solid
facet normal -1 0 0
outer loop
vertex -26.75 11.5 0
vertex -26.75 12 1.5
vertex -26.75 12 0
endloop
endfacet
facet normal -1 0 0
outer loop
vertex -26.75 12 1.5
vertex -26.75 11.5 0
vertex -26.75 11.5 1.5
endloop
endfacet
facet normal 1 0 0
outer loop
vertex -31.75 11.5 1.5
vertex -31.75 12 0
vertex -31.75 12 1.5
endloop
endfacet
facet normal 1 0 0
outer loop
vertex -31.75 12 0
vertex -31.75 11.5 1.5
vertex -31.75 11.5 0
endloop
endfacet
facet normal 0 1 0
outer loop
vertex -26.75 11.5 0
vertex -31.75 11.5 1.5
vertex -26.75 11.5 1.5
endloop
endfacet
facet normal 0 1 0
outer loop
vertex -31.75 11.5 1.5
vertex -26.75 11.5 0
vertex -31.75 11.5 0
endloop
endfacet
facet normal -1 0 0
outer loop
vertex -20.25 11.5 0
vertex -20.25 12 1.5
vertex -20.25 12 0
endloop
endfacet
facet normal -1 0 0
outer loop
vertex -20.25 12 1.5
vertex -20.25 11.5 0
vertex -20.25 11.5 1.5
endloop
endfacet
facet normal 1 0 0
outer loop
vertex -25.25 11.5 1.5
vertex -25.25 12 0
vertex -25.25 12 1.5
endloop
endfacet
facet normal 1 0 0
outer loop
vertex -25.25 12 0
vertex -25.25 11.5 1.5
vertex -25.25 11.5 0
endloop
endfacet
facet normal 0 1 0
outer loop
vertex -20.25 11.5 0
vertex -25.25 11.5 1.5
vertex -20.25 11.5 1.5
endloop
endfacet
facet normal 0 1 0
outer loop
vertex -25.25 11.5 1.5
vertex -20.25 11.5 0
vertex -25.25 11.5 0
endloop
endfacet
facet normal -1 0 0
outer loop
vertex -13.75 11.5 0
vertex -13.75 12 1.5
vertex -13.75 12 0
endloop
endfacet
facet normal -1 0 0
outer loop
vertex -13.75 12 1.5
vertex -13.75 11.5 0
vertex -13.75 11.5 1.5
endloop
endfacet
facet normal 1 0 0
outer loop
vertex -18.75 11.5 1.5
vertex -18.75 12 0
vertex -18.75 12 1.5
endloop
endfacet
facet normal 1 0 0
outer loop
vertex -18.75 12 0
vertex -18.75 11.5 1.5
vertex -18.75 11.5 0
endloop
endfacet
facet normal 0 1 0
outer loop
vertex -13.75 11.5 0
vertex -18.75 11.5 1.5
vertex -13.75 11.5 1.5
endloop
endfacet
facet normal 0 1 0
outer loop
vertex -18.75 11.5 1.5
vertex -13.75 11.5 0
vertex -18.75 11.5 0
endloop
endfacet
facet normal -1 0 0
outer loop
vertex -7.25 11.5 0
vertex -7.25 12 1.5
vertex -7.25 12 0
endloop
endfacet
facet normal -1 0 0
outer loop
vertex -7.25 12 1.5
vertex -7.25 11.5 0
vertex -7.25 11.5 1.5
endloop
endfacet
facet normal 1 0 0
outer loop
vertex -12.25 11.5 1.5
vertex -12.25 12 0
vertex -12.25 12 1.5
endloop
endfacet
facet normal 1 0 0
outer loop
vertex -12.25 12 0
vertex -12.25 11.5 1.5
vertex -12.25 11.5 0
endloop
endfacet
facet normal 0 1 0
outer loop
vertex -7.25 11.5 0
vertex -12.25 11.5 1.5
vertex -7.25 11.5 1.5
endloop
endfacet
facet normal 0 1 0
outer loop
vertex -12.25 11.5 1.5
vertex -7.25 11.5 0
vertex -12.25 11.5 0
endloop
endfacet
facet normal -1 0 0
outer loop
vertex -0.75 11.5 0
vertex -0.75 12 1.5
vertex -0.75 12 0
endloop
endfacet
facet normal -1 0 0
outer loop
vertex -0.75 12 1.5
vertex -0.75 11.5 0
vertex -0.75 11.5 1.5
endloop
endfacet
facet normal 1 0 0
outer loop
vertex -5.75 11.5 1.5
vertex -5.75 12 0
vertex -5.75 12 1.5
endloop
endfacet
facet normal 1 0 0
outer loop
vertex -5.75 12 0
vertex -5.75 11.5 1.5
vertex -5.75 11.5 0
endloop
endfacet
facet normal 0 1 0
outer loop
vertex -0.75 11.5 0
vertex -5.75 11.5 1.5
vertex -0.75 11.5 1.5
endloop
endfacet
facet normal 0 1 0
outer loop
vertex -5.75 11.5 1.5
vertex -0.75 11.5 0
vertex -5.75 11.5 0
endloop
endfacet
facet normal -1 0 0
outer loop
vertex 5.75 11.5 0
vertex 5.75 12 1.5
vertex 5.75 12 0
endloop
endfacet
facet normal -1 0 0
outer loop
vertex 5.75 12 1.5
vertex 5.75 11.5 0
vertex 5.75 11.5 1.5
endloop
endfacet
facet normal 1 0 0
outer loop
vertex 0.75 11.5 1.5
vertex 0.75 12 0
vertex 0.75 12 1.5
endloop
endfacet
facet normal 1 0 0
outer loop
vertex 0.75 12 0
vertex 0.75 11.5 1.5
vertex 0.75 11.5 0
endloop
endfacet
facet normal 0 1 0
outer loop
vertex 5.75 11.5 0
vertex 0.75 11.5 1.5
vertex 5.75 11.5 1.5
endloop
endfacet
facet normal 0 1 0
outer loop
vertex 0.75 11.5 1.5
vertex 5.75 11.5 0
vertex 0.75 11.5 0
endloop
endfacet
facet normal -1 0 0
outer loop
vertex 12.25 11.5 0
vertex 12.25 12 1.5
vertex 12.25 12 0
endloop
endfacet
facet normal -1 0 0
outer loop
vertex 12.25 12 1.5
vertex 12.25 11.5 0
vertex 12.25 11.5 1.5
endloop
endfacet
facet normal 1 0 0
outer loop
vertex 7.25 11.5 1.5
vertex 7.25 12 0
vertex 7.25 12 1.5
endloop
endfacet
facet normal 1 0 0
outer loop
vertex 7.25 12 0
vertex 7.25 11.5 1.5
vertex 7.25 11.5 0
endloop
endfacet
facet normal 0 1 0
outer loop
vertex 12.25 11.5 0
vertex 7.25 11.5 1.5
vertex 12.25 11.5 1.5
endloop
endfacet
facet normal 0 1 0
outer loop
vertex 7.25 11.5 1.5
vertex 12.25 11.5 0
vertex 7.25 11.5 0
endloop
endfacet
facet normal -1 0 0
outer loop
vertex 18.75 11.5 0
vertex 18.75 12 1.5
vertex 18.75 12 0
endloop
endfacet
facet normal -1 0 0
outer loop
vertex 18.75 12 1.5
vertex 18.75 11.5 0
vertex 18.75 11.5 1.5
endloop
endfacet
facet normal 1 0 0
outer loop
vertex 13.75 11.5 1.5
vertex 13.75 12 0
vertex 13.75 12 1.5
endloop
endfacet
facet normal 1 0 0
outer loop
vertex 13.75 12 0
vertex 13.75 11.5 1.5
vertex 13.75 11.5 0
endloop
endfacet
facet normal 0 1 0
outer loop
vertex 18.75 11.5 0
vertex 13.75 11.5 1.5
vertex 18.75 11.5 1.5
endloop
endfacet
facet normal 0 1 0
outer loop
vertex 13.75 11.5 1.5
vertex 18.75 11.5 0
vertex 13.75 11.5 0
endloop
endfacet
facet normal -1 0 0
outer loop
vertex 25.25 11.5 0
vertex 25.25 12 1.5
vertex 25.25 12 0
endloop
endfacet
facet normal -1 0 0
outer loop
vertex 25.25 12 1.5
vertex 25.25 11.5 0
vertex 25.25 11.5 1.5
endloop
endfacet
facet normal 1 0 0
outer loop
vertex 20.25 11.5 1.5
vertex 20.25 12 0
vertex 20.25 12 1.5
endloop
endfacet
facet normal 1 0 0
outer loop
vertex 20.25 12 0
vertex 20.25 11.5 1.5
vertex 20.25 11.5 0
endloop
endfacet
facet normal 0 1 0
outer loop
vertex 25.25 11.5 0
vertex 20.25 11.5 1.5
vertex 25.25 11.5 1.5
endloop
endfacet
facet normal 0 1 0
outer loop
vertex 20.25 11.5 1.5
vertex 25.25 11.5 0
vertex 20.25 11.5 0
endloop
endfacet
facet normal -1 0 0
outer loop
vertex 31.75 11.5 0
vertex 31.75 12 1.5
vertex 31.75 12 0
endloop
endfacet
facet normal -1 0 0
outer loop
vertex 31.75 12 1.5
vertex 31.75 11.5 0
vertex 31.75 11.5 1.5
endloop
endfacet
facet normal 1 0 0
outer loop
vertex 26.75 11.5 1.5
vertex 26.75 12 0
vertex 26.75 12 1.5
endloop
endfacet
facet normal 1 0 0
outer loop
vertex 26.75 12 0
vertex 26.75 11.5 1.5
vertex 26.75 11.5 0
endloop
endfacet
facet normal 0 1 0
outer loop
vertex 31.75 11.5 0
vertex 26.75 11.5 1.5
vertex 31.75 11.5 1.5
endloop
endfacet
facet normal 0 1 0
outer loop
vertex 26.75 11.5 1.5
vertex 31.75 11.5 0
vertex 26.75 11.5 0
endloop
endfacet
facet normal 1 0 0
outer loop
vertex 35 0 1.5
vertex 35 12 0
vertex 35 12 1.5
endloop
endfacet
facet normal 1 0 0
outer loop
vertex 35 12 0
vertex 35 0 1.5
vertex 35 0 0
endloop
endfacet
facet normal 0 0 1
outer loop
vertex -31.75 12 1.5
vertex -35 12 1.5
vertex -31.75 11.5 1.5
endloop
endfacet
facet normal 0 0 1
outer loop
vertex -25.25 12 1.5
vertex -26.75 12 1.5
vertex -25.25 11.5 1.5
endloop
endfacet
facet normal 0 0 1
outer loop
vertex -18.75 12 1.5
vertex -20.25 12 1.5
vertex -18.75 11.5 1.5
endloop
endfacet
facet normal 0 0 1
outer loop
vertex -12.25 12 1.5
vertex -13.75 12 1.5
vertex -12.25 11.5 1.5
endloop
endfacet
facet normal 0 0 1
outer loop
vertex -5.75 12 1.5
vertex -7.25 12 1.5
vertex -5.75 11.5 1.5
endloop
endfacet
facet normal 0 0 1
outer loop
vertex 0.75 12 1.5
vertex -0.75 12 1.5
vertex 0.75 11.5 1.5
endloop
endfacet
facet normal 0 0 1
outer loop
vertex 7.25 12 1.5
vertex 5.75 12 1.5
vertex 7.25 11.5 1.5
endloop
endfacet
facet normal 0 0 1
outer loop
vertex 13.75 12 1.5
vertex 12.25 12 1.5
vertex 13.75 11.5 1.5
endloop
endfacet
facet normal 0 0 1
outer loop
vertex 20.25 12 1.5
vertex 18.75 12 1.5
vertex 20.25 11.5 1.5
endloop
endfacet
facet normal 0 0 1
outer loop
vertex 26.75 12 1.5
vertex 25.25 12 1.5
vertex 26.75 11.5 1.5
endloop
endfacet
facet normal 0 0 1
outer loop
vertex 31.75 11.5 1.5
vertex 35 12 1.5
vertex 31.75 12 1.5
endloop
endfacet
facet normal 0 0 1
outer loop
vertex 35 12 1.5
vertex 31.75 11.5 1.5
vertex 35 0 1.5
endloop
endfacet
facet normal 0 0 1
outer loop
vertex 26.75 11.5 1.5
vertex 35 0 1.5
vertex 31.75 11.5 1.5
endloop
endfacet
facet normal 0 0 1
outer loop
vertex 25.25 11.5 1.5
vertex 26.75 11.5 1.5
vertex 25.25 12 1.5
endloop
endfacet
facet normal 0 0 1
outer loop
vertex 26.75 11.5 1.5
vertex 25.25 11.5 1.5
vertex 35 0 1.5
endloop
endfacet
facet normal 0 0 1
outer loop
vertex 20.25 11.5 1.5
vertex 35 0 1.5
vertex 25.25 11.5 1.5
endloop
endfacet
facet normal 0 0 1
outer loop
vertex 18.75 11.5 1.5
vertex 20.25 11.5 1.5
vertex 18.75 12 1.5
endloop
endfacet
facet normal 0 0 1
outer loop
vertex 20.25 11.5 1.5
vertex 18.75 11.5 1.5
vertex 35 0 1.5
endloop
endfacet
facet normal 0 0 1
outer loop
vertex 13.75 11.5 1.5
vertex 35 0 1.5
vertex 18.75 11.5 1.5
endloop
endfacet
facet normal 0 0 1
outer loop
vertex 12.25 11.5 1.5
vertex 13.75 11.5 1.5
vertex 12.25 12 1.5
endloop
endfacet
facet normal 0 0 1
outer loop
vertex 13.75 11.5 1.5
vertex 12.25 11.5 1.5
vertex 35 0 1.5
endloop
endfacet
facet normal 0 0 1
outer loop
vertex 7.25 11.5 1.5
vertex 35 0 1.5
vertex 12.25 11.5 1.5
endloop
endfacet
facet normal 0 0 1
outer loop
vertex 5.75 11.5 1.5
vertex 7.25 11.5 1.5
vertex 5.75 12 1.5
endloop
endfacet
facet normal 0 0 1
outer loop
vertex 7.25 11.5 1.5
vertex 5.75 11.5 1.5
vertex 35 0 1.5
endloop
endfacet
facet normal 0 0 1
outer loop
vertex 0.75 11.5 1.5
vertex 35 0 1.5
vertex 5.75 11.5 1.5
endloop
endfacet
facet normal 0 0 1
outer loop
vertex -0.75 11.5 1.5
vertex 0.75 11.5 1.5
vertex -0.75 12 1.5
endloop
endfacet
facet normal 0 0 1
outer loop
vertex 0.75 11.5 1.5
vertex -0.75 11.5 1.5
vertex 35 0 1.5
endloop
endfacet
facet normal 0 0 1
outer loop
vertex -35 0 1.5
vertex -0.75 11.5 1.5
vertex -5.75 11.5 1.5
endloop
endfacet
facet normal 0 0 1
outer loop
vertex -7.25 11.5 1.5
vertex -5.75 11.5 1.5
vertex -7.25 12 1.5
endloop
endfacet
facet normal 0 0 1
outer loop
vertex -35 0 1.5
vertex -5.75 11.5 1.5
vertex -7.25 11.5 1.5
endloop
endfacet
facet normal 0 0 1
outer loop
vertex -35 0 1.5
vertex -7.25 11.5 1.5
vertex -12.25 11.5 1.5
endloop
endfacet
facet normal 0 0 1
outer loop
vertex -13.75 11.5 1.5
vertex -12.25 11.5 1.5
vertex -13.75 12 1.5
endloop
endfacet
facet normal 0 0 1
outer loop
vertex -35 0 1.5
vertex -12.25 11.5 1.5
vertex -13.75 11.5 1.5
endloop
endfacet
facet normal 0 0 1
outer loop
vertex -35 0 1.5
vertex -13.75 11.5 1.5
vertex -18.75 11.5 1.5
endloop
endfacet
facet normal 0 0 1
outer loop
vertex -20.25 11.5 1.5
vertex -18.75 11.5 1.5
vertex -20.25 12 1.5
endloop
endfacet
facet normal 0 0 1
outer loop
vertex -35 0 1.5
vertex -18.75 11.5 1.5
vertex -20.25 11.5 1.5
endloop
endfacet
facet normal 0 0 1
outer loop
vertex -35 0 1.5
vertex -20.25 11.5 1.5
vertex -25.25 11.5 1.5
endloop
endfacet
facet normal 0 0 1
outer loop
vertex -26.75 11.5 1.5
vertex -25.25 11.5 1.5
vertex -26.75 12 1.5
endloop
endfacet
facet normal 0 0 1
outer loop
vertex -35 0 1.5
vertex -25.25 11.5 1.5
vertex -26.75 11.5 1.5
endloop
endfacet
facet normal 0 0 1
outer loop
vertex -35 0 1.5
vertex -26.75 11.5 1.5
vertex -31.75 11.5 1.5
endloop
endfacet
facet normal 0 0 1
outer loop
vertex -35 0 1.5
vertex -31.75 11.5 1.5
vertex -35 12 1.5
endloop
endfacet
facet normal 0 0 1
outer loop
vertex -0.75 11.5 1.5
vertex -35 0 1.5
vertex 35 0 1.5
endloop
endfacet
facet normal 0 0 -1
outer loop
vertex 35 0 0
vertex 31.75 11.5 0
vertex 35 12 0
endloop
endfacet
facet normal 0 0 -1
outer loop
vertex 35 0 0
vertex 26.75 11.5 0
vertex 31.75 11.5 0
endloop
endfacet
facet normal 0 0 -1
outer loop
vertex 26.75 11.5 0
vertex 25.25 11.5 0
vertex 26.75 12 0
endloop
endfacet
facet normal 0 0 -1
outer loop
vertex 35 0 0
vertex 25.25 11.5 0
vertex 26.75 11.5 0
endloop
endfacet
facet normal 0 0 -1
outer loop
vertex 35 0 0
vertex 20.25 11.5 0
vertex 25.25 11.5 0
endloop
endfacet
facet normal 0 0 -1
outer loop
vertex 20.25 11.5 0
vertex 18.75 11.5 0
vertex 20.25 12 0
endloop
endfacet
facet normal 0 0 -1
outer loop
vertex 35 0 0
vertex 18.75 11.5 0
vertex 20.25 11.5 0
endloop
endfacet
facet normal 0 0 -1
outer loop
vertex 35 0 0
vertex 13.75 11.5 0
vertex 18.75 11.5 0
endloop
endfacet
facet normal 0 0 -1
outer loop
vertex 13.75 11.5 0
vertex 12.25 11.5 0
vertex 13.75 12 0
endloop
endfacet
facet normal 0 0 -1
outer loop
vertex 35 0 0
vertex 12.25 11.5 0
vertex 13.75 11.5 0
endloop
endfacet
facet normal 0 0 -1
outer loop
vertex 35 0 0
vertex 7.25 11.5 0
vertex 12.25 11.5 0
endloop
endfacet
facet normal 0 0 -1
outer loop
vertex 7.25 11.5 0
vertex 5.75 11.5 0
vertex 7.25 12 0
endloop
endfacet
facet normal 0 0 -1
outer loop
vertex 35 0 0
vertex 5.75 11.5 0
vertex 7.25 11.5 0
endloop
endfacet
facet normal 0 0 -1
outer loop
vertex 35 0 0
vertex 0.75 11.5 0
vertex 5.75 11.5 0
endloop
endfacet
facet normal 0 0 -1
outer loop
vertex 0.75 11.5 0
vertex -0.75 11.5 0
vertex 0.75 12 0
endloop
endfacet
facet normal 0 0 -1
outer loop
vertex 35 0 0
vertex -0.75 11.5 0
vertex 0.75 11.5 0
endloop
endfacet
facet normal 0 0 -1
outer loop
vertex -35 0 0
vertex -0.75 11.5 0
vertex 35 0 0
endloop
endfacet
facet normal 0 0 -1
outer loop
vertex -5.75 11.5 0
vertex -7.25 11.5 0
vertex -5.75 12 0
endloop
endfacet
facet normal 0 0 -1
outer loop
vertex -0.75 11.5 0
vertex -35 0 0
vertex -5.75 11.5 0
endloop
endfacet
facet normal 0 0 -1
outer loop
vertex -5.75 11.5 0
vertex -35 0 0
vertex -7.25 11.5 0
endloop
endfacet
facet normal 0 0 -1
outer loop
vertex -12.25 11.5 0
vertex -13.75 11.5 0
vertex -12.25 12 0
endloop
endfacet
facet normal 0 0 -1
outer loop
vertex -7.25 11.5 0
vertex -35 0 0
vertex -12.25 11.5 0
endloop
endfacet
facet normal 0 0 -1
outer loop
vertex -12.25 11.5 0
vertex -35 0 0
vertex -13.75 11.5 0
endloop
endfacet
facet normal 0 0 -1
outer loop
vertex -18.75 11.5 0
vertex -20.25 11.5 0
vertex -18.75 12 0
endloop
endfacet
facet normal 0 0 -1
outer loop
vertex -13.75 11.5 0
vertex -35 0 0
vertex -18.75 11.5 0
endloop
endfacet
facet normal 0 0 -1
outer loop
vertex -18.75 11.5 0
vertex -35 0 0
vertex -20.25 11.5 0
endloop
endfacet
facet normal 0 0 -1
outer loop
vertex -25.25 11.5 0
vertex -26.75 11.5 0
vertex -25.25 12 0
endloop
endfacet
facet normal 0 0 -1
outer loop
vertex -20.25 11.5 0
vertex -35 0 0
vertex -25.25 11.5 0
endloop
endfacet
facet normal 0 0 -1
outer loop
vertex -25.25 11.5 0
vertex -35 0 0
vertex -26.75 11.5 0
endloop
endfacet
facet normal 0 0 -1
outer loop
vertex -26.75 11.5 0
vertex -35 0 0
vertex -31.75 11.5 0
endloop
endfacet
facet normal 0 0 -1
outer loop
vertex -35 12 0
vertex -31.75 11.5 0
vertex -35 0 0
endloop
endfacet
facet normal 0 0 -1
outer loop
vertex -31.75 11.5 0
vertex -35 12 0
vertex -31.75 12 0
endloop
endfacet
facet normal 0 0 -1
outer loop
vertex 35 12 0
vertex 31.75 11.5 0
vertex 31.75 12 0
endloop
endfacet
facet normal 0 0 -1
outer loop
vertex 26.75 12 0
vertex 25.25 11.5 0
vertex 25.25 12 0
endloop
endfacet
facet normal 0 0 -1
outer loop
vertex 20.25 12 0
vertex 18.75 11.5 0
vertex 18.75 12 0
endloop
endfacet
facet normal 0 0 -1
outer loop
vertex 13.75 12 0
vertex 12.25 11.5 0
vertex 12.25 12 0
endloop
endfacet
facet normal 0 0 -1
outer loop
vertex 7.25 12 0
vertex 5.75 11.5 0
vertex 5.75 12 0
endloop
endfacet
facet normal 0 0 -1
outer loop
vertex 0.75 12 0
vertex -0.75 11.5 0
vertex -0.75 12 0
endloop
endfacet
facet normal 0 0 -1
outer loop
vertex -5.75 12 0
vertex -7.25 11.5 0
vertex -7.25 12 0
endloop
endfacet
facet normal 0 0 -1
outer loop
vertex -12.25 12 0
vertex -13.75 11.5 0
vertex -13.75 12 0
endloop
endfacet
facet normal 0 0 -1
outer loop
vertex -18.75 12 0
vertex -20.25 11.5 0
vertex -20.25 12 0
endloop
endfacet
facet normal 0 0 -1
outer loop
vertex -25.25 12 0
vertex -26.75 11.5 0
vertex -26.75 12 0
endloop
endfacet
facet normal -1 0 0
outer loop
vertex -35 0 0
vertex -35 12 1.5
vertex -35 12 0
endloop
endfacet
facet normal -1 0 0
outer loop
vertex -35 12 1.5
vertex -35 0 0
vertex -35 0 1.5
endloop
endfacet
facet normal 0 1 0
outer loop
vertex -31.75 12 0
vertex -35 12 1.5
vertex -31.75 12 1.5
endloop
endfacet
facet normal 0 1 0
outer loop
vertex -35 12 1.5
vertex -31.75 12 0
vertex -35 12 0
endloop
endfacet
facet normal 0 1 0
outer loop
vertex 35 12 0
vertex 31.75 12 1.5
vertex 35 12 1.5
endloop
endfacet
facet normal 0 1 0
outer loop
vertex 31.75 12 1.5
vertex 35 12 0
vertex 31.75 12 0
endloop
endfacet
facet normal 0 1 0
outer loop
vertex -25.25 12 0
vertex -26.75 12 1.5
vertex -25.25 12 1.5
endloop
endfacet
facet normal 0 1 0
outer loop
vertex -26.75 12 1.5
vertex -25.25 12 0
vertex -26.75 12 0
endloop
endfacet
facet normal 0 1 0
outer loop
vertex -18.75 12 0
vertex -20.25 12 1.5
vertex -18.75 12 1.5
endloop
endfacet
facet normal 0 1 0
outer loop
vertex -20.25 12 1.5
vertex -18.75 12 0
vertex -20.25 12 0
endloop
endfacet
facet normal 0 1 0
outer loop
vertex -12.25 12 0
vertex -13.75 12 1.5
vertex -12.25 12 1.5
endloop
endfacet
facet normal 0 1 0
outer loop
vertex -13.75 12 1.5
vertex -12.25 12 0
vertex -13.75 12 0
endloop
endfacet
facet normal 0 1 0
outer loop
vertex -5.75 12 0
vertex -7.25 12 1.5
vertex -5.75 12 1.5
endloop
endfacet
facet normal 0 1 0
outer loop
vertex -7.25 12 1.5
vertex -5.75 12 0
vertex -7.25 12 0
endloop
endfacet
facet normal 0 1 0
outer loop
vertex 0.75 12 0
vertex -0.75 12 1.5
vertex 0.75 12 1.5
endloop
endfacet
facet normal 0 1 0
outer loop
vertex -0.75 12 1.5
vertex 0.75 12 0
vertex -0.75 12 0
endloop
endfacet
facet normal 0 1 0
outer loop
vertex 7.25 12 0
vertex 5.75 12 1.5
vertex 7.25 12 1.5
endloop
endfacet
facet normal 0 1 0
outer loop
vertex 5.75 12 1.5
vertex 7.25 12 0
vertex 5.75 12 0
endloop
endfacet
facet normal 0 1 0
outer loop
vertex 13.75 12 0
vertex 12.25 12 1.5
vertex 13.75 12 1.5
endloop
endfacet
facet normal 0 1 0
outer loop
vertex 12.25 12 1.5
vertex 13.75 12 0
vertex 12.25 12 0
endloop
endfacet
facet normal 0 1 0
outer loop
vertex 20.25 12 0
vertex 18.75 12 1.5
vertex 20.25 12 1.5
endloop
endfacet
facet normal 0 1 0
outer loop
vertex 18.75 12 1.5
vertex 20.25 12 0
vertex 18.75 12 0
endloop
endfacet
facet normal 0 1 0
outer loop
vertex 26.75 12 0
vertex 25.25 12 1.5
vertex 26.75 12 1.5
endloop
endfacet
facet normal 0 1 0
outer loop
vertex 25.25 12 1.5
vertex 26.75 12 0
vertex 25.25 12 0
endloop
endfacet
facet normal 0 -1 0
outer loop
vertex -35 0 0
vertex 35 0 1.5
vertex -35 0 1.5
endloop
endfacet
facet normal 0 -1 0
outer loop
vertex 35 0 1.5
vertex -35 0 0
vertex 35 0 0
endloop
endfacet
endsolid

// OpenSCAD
// 10-well comb for agarose gel casting
// Printed lying flat, teeth pointing down (-Y)

$fn = 64;

// --- Spine ---
spine_len   = 70;   // length along X
spine_wid   = 12;   // width along Y
spine_thk   = 1.5;  // thickness along Z

// --- Teeth ---
tooth_count = 10;   // number of teeth
tooth_w     = 5.0;  // tooth width along X
tooth_len   = 12;   // tooth length along Y
tooth_gap   = 1.5;  // gap between teeth along X

// --- Cutting overlap ---
eps         = 0.5;  // extension of cutters past faces

pitch       = tooth_w + tooth_gap;
x_start     = -(tooth_count - 1) * pitch / 2;

difference() {
    // Spine
    translate([-spine_len/2, 0, 0])
        cube([spine_len, spine_wid, spine_thk]);

    // Teeth
    for (i = [0 : tooth_count - 1])
        translate([x_start + i * pitch - tooth_w/2,
                   spine_wid - eps,
                   -eps])
            cube([tooth_w, tooth_len + eps, spine_thk + 2*eps]);
}
